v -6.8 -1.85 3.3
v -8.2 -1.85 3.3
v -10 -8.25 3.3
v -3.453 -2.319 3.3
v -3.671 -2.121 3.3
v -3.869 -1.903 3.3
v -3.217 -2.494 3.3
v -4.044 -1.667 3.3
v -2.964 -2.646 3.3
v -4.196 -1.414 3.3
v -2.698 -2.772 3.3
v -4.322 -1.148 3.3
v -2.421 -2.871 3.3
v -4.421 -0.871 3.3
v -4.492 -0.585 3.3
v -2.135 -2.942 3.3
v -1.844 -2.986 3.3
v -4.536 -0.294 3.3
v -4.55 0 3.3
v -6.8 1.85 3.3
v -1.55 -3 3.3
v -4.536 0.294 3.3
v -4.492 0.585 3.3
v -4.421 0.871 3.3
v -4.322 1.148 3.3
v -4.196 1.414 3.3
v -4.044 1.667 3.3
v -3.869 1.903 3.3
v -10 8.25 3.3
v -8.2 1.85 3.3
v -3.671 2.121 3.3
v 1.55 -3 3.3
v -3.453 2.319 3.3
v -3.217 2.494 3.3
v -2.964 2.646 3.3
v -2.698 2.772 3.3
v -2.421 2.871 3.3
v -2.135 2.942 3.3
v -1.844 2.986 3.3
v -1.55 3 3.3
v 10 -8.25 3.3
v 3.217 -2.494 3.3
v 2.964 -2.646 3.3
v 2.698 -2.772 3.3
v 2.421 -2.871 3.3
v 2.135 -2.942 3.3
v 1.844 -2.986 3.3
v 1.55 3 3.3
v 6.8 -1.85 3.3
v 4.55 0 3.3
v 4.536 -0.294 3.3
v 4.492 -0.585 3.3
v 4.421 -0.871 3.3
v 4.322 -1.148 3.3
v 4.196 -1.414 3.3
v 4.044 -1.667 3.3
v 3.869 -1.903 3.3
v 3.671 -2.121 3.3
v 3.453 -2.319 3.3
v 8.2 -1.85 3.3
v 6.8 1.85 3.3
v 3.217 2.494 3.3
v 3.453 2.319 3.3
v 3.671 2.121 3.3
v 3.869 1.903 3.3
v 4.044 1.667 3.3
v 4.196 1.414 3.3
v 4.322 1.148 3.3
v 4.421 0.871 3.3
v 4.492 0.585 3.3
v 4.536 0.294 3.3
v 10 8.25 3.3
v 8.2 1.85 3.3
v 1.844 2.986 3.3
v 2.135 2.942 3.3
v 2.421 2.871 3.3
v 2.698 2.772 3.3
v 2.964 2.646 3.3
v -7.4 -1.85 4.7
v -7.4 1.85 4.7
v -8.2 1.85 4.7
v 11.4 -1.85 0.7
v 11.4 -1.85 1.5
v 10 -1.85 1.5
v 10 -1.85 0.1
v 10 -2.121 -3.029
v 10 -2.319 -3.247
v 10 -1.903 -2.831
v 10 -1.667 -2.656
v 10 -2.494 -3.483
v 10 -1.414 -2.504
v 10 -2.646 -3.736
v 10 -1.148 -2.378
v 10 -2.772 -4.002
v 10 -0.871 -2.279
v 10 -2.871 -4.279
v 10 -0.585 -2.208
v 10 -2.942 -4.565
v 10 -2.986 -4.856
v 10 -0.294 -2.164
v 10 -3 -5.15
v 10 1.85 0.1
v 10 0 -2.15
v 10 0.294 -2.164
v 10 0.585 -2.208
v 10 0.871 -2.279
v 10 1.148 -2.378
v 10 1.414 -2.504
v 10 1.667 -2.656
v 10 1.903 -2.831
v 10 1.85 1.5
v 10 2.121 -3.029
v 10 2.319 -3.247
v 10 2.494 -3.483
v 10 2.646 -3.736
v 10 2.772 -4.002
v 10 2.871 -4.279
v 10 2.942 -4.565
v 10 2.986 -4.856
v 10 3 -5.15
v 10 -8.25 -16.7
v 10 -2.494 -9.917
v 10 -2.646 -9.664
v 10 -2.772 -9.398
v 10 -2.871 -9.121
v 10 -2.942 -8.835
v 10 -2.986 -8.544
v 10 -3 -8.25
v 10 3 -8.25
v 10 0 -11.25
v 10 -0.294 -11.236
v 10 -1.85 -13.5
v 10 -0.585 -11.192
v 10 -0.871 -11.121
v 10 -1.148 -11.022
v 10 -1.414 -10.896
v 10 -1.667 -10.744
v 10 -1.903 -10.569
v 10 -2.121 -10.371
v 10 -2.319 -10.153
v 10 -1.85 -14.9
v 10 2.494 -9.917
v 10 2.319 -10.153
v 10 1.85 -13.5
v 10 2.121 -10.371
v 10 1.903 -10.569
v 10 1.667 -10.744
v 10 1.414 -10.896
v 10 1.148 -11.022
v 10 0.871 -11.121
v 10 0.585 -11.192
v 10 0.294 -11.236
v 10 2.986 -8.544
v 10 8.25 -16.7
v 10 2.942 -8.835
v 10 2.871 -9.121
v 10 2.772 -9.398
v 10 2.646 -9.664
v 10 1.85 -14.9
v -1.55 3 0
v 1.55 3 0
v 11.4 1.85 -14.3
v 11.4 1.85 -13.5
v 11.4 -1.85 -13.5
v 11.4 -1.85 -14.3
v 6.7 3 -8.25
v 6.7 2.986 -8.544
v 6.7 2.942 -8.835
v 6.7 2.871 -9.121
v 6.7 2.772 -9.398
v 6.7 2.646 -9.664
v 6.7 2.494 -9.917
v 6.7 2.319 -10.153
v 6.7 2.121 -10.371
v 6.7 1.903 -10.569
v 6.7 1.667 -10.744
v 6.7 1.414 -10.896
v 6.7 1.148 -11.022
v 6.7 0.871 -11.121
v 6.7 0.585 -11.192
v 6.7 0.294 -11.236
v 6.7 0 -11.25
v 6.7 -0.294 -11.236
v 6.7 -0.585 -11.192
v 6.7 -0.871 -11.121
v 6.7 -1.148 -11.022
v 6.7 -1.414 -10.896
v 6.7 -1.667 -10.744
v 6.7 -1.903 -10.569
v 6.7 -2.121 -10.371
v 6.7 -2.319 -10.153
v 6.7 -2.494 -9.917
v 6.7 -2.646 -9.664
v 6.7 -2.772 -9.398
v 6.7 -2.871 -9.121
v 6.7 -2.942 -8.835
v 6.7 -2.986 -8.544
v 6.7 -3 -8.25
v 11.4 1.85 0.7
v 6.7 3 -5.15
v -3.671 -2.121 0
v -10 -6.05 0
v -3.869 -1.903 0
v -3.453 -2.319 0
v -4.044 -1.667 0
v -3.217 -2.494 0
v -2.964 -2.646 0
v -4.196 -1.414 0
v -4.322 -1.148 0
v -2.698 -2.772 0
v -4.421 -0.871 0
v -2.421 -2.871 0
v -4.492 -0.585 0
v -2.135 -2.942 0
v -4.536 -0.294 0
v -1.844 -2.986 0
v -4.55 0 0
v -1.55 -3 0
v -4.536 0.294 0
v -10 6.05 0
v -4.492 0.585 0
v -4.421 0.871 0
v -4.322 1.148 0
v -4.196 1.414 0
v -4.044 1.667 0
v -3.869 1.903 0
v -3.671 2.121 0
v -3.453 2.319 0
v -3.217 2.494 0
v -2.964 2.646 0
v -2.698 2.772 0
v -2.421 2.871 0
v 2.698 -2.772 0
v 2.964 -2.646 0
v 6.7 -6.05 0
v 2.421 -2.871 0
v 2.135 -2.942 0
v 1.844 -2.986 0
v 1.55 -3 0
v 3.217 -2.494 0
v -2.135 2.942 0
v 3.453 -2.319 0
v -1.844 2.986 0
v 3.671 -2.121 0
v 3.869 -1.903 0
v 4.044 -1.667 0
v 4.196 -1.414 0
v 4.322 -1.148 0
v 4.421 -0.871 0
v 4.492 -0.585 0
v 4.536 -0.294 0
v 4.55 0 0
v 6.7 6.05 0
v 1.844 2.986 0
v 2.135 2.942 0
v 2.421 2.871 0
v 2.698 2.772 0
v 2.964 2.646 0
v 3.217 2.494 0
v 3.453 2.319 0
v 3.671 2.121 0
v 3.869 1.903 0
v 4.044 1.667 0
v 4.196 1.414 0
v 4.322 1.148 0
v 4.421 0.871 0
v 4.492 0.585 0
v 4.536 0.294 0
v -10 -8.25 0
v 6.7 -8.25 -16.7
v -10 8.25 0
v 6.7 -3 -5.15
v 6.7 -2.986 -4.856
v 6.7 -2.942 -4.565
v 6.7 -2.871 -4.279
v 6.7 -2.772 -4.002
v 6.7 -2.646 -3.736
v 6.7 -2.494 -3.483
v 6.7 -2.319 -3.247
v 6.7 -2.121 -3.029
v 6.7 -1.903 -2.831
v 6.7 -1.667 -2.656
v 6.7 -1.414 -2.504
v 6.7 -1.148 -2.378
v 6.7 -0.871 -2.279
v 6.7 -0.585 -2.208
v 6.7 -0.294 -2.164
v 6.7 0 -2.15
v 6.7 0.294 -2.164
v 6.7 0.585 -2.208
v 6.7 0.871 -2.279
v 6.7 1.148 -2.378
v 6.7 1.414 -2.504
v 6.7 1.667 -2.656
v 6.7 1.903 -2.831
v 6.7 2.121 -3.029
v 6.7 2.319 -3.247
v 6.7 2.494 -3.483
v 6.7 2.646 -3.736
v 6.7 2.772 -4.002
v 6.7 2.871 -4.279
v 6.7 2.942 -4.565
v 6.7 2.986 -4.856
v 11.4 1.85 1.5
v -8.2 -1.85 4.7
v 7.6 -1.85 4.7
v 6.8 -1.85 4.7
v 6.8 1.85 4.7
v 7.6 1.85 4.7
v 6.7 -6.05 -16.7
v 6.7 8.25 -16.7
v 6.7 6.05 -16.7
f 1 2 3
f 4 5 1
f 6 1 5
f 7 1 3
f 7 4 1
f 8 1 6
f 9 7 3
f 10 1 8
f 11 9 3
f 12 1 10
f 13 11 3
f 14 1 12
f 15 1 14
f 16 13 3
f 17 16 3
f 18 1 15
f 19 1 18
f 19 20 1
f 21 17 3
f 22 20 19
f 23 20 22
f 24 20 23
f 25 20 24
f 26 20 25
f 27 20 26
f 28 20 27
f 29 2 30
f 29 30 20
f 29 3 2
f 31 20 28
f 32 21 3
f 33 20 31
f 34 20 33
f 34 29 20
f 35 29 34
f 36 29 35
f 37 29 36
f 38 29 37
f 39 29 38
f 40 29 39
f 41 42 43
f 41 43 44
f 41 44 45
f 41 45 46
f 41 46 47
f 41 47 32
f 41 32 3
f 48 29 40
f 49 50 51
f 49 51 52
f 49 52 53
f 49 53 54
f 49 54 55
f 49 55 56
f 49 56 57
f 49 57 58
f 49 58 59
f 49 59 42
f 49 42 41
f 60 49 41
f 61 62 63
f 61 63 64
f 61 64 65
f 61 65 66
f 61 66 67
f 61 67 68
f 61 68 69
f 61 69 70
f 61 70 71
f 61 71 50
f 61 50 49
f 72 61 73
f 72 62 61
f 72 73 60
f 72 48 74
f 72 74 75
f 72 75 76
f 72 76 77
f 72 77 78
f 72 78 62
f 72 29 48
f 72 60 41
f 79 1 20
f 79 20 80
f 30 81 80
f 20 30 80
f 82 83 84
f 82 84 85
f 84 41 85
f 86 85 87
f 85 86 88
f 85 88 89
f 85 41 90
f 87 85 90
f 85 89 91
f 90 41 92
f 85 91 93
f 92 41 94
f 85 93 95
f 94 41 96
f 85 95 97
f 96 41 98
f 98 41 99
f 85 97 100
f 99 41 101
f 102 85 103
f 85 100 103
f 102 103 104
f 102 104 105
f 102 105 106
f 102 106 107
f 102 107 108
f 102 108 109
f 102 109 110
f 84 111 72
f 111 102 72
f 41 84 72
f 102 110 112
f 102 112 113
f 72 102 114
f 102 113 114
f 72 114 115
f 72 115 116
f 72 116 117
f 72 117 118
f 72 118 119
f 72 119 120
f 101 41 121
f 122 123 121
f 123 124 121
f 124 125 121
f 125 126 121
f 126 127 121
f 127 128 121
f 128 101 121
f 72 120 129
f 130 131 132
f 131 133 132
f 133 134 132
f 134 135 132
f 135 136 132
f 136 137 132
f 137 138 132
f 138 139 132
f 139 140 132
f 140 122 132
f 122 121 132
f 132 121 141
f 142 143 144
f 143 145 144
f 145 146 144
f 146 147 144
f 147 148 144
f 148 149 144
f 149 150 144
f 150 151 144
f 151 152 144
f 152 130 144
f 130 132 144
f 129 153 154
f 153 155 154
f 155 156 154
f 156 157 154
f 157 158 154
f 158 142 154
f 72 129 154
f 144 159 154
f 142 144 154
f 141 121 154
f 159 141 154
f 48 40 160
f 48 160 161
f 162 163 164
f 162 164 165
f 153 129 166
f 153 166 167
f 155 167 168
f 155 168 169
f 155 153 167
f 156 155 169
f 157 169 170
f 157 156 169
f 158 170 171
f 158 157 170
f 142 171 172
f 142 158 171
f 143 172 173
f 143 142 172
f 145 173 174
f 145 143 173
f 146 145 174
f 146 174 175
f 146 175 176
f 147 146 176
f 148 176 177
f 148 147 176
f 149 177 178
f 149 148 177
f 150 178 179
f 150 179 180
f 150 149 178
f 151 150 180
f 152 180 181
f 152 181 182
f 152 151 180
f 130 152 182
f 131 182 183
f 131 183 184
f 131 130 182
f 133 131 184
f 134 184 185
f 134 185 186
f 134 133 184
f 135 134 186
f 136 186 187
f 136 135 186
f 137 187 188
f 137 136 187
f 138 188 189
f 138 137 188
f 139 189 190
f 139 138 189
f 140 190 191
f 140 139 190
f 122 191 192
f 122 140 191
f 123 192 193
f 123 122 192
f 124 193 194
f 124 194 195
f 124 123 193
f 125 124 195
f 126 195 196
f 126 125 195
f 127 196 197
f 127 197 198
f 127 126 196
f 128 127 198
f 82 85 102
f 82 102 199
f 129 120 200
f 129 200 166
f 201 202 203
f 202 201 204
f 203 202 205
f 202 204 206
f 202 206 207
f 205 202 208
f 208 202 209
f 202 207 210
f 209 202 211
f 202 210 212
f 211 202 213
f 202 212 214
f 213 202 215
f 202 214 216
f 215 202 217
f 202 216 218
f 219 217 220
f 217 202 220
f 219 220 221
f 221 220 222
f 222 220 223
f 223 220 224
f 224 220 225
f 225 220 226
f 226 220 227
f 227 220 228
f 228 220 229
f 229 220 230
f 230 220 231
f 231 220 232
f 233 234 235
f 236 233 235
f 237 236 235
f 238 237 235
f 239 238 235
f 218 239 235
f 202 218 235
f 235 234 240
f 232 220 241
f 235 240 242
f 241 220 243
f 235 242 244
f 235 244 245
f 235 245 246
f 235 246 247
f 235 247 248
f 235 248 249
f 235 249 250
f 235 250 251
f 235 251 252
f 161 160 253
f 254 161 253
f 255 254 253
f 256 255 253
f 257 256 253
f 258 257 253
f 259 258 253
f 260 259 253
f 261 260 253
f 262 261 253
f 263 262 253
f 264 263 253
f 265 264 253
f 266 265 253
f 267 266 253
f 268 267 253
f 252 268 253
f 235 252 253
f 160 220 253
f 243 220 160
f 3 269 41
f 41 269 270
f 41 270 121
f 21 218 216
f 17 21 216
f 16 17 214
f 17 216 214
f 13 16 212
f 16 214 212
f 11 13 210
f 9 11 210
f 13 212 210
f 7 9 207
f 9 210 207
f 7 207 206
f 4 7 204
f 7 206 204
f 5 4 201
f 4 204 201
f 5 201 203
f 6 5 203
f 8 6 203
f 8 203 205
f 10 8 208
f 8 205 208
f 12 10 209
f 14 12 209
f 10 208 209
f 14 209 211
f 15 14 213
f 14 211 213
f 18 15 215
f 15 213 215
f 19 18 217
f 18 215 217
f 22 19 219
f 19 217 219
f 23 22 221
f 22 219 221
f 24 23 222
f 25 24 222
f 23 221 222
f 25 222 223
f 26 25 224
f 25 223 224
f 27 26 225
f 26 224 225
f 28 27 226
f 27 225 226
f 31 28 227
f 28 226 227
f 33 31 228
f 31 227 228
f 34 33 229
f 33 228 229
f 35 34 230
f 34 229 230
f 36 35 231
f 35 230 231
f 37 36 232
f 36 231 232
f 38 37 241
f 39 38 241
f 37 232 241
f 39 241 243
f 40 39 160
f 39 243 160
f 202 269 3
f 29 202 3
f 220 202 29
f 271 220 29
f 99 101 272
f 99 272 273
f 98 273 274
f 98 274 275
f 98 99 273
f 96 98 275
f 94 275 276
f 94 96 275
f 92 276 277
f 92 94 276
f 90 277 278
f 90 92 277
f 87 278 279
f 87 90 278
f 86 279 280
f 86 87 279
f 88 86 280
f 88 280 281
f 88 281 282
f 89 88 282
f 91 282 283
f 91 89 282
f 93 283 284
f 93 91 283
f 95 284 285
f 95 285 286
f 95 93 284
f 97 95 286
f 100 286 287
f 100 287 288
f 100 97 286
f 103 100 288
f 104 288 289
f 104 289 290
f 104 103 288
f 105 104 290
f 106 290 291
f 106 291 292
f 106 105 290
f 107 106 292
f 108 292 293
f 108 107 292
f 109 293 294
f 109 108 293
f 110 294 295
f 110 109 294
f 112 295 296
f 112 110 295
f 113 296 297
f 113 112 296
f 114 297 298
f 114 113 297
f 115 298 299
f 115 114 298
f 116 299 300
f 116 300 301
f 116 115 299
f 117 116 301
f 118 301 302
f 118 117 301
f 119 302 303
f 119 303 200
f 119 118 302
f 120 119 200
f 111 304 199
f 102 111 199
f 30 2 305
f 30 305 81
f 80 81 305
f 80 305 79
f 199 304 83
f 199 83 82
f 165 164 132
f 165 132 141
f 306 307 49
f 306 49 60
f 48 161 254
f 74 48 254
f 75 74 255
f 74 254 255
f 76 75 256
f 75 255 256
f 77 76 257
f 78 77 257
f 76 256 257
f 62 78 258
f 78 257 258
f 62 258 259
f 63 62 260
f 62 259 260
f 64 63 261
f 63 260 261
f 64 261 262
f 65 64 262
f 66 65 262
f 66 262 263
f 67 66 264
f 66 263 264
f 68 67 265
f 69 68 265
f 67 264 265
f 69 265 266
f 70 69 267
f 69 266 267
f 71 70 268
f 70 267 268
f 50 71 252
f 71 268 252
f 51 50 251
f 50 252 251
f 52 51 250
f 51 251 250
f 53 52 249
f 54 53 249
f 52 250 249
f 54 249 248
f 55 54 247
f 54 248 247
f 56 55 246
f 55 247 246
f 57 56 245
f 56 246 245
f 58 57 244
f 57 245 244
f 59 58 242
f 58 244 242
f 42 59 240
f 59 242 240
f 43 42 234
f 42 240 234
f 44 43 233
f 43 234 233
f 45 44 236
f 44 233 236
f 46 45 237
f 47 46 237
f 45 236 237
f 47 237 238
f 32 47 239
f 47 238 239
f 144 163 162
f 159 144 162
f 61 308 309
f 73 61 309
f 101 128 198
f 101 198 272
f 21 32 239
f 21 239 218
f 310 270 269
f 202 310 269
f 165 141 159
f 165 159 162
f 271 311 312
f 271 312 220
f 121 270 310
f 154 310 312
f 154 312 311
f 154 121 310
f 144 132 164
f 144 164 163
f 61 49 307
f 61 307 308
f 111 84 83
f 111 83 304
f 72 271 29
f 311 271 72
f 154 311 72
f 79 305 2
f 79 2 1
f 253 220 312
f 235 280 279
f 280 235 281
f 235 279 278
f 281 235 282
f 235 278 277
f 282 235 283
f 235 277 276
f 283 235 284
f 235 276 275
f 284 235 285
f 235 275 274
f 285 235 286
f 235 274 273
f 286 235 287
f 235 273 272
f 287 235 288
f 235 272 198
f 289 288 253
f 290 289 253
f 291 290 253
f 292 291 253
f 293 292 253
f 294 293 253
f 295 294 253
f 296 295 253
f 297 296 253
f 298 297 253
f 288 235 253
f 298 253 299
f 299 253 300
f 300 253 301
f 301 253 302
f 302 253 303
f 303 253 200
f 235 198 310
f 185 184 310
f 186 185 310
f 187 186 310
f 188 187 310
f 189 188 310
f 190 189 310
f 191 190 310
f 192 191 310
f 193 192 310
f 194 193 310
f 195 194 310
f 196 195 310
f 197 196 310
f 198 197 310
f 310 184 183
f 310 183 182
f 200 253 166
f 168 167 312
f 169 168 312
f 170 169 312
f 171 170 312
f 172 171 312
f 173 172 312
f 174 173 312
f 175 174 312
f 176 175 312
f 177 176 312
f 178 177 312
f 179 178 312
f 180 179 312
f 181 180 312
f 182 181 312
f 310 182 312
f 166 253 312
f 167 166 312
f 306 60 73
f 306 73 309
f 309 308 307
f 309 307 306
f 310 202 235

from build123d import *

# Parameters (mm, degrees)
CROQUIS1_W              = 20
CROQUIS1_H              = 16.5
SALIENTE_EXTRUIR1_DEPTH = 3.3
CROQUIS2_W              = 1.4
CROQUIS2_H              = 3.7
SALIENTE_EXTRUIR2_DEPTH = 1.4
CORTAR_EXTRUIR1_DEPTH   = 3.7
CORTAR_EXTRUIR2_DEPTH   = 3.7
CROQUIS6_W              = 20
CROQUIS6_H              = 16.5
SALIENTE_EXTRUIR3_DEPTH = 3.3
CROQUIS7_W              = 1.4
CROQUIS7_H              = 3.7
SALIENTE_EXTRUIR4_DEPTH = 1.4
CORTAR_EXTRUIR3_DEPTH   = 3.7
CORTAR_EXTRUIR4_DEPTH   = 3.7
SALIENTE_EXTRUIR5_DEPTH = 2.2
SALIENTE_EXTRUIR6_DEPTH = 2.2


with BuildPart() as part:
    # Croquis1 → Saliente-Extruir1 (new body)
    with BuildSketch(Plane.XY):
        Rectangle(CROQUIS1_W, CROQUIS1_H)
        with BuildLine():
            Line((-1.55, 3), (1.55, 3))
            ThreePointArc((1.55, 3), (4.55, 0), (1.55, -3))
            Line((1.55, -3), (-1.55, -3))
            ThreePointArc((-1.55, -3), (-4.55, 0), (-1.55, 3))
        make_face(mode=Mode.SUBTRACT)
    extrude(amount=SALIENTE_EXTRUIR1_DEPTH)

    # Croquis2 → Saliente-Extruir2 (add)
    with BuildSketch(Plane.XY.offset(3.3)):
        with Locations((-7.5, 0)):
            Rectangle(CROQUIS2_W, CROQUIS2_H)
        with Locations((7.5, 0)):
            Rectangle(CROQUIS2_W, CROQUIS2_H)
    extrude(amount=SALIENTE_EXTRUIR2_DEPTH)

    # Croquis4 → Cortar-Extruir1 (cut)
    with BuildSketch(Plane.XZ.offset(1.85)):
        Polygon((8.2, 3.3), (7.6, 4.7), (8.2, 4.7), align=None)
    extrude(amount=-CORTAR_EXTRUIR1_DEPTH, mode=Mode.SUBTRACT)

    # Croquis5 → Cortar-Extruir2 (cut)
    with BuildSketch(Plane.XZ.offset(1.85)):
        Polygon((-6.8, 3.3), (-7.4, 4.7), (-6.8, 4.7), align=None)
    extrude(amount=-CORTAR_EXTRUIR2_DEPTH, mode=Mode.SUBTRACT)

    # Croquis6 → Saliente-Extruir3 (add)
    with BuildSketch(Plane(origin=(10, 0, 0), x_dir=(0, 0, -1), z_dir=(1, 0, 0))):
        with Locations((6.7, 0)):
            Rectangle(CROQUIS6_W, CROQUIS6_H)
        with BuildLine():
            Line((5.15, 3), (8.25, 3))
            ThreePointArc((8.25, 3), (11.25, 0), (8.25, -3))
            Line((8.25, -3), (5.15, -3))
            ThreePointArc((5.15, -3), (2.15, 0), (5.15, 3))
        make_face(mode=Mode.SUBTRACT)
    extrude(amount=-SALIENTE_EXTRUIR3_DEPTH)

    # Croquis7 → Saliente-Extruir4 (add)
    with BuildSketch(Plane(origin=(10, 0, 0), x_dir=(0, 0, -1), z_dir=(1, 0, 0))):
        with Locations((-0.8, 0)):
            Rectangle(CROQUIS7_W, CROQUIS7_H)
        with Locations((14.2, 0)):
            Rectangle(CROQUIS7_W, CROQUIS7_H)
    extrude(amount=SALIENTE_EXTRUIR4_DEPTH)

    # Croquis11 → Cortar-Extruir3 (cut)
    with BuildSketch(Plane.XZ.offset(1.85)):
        Polygon((11.4, 0.1), (10, 0.1), (11.4, 0.7), align=None)
    extrude(amount=-CORTAR_EXTRUIR3_DEPTH, mode=Mode.SUBTRACT)

    # Croquis12 → Cortar-Extruir4 (cut)
    with BuildSketch(Plane.XZ.offset(1.85)):
        Polygon((11.4, -14.9), (10, -14.9), (11.4, -14.3), align=None)
    extrude(amount=-CORTAR_EXTRUIR4_DEPTH, mode=Mode.SUBTRACT)

    # Croquis13 → Saliente-Extruir5 (add)
    with BuildSketch(Plane(origin=(0, -8.25, 0), x_dir=(-1, 0, 0), z_dir=(0, -1, 0))):
        Polygon((-6.7, 16.7), (10, 0), (-6.7, 0), align=None)
    extrude(amount=-SALIENTE_EXTRUIR5_DEPTH)

    # Croquis14 → Saliente-Extruir6 (add)
    with BuildSketch(Plane(origin=(0, 8.25, 0), x_dir=(1, 0, 0), z_dir=(0, 1, 0))):
        Polygon((6.7, 16.7), (-10, 0), (6.7, 0), align=None)
    extrude(amount=-SALIENTE_EXTRUIR6_DEPTH)


solid = part.part
